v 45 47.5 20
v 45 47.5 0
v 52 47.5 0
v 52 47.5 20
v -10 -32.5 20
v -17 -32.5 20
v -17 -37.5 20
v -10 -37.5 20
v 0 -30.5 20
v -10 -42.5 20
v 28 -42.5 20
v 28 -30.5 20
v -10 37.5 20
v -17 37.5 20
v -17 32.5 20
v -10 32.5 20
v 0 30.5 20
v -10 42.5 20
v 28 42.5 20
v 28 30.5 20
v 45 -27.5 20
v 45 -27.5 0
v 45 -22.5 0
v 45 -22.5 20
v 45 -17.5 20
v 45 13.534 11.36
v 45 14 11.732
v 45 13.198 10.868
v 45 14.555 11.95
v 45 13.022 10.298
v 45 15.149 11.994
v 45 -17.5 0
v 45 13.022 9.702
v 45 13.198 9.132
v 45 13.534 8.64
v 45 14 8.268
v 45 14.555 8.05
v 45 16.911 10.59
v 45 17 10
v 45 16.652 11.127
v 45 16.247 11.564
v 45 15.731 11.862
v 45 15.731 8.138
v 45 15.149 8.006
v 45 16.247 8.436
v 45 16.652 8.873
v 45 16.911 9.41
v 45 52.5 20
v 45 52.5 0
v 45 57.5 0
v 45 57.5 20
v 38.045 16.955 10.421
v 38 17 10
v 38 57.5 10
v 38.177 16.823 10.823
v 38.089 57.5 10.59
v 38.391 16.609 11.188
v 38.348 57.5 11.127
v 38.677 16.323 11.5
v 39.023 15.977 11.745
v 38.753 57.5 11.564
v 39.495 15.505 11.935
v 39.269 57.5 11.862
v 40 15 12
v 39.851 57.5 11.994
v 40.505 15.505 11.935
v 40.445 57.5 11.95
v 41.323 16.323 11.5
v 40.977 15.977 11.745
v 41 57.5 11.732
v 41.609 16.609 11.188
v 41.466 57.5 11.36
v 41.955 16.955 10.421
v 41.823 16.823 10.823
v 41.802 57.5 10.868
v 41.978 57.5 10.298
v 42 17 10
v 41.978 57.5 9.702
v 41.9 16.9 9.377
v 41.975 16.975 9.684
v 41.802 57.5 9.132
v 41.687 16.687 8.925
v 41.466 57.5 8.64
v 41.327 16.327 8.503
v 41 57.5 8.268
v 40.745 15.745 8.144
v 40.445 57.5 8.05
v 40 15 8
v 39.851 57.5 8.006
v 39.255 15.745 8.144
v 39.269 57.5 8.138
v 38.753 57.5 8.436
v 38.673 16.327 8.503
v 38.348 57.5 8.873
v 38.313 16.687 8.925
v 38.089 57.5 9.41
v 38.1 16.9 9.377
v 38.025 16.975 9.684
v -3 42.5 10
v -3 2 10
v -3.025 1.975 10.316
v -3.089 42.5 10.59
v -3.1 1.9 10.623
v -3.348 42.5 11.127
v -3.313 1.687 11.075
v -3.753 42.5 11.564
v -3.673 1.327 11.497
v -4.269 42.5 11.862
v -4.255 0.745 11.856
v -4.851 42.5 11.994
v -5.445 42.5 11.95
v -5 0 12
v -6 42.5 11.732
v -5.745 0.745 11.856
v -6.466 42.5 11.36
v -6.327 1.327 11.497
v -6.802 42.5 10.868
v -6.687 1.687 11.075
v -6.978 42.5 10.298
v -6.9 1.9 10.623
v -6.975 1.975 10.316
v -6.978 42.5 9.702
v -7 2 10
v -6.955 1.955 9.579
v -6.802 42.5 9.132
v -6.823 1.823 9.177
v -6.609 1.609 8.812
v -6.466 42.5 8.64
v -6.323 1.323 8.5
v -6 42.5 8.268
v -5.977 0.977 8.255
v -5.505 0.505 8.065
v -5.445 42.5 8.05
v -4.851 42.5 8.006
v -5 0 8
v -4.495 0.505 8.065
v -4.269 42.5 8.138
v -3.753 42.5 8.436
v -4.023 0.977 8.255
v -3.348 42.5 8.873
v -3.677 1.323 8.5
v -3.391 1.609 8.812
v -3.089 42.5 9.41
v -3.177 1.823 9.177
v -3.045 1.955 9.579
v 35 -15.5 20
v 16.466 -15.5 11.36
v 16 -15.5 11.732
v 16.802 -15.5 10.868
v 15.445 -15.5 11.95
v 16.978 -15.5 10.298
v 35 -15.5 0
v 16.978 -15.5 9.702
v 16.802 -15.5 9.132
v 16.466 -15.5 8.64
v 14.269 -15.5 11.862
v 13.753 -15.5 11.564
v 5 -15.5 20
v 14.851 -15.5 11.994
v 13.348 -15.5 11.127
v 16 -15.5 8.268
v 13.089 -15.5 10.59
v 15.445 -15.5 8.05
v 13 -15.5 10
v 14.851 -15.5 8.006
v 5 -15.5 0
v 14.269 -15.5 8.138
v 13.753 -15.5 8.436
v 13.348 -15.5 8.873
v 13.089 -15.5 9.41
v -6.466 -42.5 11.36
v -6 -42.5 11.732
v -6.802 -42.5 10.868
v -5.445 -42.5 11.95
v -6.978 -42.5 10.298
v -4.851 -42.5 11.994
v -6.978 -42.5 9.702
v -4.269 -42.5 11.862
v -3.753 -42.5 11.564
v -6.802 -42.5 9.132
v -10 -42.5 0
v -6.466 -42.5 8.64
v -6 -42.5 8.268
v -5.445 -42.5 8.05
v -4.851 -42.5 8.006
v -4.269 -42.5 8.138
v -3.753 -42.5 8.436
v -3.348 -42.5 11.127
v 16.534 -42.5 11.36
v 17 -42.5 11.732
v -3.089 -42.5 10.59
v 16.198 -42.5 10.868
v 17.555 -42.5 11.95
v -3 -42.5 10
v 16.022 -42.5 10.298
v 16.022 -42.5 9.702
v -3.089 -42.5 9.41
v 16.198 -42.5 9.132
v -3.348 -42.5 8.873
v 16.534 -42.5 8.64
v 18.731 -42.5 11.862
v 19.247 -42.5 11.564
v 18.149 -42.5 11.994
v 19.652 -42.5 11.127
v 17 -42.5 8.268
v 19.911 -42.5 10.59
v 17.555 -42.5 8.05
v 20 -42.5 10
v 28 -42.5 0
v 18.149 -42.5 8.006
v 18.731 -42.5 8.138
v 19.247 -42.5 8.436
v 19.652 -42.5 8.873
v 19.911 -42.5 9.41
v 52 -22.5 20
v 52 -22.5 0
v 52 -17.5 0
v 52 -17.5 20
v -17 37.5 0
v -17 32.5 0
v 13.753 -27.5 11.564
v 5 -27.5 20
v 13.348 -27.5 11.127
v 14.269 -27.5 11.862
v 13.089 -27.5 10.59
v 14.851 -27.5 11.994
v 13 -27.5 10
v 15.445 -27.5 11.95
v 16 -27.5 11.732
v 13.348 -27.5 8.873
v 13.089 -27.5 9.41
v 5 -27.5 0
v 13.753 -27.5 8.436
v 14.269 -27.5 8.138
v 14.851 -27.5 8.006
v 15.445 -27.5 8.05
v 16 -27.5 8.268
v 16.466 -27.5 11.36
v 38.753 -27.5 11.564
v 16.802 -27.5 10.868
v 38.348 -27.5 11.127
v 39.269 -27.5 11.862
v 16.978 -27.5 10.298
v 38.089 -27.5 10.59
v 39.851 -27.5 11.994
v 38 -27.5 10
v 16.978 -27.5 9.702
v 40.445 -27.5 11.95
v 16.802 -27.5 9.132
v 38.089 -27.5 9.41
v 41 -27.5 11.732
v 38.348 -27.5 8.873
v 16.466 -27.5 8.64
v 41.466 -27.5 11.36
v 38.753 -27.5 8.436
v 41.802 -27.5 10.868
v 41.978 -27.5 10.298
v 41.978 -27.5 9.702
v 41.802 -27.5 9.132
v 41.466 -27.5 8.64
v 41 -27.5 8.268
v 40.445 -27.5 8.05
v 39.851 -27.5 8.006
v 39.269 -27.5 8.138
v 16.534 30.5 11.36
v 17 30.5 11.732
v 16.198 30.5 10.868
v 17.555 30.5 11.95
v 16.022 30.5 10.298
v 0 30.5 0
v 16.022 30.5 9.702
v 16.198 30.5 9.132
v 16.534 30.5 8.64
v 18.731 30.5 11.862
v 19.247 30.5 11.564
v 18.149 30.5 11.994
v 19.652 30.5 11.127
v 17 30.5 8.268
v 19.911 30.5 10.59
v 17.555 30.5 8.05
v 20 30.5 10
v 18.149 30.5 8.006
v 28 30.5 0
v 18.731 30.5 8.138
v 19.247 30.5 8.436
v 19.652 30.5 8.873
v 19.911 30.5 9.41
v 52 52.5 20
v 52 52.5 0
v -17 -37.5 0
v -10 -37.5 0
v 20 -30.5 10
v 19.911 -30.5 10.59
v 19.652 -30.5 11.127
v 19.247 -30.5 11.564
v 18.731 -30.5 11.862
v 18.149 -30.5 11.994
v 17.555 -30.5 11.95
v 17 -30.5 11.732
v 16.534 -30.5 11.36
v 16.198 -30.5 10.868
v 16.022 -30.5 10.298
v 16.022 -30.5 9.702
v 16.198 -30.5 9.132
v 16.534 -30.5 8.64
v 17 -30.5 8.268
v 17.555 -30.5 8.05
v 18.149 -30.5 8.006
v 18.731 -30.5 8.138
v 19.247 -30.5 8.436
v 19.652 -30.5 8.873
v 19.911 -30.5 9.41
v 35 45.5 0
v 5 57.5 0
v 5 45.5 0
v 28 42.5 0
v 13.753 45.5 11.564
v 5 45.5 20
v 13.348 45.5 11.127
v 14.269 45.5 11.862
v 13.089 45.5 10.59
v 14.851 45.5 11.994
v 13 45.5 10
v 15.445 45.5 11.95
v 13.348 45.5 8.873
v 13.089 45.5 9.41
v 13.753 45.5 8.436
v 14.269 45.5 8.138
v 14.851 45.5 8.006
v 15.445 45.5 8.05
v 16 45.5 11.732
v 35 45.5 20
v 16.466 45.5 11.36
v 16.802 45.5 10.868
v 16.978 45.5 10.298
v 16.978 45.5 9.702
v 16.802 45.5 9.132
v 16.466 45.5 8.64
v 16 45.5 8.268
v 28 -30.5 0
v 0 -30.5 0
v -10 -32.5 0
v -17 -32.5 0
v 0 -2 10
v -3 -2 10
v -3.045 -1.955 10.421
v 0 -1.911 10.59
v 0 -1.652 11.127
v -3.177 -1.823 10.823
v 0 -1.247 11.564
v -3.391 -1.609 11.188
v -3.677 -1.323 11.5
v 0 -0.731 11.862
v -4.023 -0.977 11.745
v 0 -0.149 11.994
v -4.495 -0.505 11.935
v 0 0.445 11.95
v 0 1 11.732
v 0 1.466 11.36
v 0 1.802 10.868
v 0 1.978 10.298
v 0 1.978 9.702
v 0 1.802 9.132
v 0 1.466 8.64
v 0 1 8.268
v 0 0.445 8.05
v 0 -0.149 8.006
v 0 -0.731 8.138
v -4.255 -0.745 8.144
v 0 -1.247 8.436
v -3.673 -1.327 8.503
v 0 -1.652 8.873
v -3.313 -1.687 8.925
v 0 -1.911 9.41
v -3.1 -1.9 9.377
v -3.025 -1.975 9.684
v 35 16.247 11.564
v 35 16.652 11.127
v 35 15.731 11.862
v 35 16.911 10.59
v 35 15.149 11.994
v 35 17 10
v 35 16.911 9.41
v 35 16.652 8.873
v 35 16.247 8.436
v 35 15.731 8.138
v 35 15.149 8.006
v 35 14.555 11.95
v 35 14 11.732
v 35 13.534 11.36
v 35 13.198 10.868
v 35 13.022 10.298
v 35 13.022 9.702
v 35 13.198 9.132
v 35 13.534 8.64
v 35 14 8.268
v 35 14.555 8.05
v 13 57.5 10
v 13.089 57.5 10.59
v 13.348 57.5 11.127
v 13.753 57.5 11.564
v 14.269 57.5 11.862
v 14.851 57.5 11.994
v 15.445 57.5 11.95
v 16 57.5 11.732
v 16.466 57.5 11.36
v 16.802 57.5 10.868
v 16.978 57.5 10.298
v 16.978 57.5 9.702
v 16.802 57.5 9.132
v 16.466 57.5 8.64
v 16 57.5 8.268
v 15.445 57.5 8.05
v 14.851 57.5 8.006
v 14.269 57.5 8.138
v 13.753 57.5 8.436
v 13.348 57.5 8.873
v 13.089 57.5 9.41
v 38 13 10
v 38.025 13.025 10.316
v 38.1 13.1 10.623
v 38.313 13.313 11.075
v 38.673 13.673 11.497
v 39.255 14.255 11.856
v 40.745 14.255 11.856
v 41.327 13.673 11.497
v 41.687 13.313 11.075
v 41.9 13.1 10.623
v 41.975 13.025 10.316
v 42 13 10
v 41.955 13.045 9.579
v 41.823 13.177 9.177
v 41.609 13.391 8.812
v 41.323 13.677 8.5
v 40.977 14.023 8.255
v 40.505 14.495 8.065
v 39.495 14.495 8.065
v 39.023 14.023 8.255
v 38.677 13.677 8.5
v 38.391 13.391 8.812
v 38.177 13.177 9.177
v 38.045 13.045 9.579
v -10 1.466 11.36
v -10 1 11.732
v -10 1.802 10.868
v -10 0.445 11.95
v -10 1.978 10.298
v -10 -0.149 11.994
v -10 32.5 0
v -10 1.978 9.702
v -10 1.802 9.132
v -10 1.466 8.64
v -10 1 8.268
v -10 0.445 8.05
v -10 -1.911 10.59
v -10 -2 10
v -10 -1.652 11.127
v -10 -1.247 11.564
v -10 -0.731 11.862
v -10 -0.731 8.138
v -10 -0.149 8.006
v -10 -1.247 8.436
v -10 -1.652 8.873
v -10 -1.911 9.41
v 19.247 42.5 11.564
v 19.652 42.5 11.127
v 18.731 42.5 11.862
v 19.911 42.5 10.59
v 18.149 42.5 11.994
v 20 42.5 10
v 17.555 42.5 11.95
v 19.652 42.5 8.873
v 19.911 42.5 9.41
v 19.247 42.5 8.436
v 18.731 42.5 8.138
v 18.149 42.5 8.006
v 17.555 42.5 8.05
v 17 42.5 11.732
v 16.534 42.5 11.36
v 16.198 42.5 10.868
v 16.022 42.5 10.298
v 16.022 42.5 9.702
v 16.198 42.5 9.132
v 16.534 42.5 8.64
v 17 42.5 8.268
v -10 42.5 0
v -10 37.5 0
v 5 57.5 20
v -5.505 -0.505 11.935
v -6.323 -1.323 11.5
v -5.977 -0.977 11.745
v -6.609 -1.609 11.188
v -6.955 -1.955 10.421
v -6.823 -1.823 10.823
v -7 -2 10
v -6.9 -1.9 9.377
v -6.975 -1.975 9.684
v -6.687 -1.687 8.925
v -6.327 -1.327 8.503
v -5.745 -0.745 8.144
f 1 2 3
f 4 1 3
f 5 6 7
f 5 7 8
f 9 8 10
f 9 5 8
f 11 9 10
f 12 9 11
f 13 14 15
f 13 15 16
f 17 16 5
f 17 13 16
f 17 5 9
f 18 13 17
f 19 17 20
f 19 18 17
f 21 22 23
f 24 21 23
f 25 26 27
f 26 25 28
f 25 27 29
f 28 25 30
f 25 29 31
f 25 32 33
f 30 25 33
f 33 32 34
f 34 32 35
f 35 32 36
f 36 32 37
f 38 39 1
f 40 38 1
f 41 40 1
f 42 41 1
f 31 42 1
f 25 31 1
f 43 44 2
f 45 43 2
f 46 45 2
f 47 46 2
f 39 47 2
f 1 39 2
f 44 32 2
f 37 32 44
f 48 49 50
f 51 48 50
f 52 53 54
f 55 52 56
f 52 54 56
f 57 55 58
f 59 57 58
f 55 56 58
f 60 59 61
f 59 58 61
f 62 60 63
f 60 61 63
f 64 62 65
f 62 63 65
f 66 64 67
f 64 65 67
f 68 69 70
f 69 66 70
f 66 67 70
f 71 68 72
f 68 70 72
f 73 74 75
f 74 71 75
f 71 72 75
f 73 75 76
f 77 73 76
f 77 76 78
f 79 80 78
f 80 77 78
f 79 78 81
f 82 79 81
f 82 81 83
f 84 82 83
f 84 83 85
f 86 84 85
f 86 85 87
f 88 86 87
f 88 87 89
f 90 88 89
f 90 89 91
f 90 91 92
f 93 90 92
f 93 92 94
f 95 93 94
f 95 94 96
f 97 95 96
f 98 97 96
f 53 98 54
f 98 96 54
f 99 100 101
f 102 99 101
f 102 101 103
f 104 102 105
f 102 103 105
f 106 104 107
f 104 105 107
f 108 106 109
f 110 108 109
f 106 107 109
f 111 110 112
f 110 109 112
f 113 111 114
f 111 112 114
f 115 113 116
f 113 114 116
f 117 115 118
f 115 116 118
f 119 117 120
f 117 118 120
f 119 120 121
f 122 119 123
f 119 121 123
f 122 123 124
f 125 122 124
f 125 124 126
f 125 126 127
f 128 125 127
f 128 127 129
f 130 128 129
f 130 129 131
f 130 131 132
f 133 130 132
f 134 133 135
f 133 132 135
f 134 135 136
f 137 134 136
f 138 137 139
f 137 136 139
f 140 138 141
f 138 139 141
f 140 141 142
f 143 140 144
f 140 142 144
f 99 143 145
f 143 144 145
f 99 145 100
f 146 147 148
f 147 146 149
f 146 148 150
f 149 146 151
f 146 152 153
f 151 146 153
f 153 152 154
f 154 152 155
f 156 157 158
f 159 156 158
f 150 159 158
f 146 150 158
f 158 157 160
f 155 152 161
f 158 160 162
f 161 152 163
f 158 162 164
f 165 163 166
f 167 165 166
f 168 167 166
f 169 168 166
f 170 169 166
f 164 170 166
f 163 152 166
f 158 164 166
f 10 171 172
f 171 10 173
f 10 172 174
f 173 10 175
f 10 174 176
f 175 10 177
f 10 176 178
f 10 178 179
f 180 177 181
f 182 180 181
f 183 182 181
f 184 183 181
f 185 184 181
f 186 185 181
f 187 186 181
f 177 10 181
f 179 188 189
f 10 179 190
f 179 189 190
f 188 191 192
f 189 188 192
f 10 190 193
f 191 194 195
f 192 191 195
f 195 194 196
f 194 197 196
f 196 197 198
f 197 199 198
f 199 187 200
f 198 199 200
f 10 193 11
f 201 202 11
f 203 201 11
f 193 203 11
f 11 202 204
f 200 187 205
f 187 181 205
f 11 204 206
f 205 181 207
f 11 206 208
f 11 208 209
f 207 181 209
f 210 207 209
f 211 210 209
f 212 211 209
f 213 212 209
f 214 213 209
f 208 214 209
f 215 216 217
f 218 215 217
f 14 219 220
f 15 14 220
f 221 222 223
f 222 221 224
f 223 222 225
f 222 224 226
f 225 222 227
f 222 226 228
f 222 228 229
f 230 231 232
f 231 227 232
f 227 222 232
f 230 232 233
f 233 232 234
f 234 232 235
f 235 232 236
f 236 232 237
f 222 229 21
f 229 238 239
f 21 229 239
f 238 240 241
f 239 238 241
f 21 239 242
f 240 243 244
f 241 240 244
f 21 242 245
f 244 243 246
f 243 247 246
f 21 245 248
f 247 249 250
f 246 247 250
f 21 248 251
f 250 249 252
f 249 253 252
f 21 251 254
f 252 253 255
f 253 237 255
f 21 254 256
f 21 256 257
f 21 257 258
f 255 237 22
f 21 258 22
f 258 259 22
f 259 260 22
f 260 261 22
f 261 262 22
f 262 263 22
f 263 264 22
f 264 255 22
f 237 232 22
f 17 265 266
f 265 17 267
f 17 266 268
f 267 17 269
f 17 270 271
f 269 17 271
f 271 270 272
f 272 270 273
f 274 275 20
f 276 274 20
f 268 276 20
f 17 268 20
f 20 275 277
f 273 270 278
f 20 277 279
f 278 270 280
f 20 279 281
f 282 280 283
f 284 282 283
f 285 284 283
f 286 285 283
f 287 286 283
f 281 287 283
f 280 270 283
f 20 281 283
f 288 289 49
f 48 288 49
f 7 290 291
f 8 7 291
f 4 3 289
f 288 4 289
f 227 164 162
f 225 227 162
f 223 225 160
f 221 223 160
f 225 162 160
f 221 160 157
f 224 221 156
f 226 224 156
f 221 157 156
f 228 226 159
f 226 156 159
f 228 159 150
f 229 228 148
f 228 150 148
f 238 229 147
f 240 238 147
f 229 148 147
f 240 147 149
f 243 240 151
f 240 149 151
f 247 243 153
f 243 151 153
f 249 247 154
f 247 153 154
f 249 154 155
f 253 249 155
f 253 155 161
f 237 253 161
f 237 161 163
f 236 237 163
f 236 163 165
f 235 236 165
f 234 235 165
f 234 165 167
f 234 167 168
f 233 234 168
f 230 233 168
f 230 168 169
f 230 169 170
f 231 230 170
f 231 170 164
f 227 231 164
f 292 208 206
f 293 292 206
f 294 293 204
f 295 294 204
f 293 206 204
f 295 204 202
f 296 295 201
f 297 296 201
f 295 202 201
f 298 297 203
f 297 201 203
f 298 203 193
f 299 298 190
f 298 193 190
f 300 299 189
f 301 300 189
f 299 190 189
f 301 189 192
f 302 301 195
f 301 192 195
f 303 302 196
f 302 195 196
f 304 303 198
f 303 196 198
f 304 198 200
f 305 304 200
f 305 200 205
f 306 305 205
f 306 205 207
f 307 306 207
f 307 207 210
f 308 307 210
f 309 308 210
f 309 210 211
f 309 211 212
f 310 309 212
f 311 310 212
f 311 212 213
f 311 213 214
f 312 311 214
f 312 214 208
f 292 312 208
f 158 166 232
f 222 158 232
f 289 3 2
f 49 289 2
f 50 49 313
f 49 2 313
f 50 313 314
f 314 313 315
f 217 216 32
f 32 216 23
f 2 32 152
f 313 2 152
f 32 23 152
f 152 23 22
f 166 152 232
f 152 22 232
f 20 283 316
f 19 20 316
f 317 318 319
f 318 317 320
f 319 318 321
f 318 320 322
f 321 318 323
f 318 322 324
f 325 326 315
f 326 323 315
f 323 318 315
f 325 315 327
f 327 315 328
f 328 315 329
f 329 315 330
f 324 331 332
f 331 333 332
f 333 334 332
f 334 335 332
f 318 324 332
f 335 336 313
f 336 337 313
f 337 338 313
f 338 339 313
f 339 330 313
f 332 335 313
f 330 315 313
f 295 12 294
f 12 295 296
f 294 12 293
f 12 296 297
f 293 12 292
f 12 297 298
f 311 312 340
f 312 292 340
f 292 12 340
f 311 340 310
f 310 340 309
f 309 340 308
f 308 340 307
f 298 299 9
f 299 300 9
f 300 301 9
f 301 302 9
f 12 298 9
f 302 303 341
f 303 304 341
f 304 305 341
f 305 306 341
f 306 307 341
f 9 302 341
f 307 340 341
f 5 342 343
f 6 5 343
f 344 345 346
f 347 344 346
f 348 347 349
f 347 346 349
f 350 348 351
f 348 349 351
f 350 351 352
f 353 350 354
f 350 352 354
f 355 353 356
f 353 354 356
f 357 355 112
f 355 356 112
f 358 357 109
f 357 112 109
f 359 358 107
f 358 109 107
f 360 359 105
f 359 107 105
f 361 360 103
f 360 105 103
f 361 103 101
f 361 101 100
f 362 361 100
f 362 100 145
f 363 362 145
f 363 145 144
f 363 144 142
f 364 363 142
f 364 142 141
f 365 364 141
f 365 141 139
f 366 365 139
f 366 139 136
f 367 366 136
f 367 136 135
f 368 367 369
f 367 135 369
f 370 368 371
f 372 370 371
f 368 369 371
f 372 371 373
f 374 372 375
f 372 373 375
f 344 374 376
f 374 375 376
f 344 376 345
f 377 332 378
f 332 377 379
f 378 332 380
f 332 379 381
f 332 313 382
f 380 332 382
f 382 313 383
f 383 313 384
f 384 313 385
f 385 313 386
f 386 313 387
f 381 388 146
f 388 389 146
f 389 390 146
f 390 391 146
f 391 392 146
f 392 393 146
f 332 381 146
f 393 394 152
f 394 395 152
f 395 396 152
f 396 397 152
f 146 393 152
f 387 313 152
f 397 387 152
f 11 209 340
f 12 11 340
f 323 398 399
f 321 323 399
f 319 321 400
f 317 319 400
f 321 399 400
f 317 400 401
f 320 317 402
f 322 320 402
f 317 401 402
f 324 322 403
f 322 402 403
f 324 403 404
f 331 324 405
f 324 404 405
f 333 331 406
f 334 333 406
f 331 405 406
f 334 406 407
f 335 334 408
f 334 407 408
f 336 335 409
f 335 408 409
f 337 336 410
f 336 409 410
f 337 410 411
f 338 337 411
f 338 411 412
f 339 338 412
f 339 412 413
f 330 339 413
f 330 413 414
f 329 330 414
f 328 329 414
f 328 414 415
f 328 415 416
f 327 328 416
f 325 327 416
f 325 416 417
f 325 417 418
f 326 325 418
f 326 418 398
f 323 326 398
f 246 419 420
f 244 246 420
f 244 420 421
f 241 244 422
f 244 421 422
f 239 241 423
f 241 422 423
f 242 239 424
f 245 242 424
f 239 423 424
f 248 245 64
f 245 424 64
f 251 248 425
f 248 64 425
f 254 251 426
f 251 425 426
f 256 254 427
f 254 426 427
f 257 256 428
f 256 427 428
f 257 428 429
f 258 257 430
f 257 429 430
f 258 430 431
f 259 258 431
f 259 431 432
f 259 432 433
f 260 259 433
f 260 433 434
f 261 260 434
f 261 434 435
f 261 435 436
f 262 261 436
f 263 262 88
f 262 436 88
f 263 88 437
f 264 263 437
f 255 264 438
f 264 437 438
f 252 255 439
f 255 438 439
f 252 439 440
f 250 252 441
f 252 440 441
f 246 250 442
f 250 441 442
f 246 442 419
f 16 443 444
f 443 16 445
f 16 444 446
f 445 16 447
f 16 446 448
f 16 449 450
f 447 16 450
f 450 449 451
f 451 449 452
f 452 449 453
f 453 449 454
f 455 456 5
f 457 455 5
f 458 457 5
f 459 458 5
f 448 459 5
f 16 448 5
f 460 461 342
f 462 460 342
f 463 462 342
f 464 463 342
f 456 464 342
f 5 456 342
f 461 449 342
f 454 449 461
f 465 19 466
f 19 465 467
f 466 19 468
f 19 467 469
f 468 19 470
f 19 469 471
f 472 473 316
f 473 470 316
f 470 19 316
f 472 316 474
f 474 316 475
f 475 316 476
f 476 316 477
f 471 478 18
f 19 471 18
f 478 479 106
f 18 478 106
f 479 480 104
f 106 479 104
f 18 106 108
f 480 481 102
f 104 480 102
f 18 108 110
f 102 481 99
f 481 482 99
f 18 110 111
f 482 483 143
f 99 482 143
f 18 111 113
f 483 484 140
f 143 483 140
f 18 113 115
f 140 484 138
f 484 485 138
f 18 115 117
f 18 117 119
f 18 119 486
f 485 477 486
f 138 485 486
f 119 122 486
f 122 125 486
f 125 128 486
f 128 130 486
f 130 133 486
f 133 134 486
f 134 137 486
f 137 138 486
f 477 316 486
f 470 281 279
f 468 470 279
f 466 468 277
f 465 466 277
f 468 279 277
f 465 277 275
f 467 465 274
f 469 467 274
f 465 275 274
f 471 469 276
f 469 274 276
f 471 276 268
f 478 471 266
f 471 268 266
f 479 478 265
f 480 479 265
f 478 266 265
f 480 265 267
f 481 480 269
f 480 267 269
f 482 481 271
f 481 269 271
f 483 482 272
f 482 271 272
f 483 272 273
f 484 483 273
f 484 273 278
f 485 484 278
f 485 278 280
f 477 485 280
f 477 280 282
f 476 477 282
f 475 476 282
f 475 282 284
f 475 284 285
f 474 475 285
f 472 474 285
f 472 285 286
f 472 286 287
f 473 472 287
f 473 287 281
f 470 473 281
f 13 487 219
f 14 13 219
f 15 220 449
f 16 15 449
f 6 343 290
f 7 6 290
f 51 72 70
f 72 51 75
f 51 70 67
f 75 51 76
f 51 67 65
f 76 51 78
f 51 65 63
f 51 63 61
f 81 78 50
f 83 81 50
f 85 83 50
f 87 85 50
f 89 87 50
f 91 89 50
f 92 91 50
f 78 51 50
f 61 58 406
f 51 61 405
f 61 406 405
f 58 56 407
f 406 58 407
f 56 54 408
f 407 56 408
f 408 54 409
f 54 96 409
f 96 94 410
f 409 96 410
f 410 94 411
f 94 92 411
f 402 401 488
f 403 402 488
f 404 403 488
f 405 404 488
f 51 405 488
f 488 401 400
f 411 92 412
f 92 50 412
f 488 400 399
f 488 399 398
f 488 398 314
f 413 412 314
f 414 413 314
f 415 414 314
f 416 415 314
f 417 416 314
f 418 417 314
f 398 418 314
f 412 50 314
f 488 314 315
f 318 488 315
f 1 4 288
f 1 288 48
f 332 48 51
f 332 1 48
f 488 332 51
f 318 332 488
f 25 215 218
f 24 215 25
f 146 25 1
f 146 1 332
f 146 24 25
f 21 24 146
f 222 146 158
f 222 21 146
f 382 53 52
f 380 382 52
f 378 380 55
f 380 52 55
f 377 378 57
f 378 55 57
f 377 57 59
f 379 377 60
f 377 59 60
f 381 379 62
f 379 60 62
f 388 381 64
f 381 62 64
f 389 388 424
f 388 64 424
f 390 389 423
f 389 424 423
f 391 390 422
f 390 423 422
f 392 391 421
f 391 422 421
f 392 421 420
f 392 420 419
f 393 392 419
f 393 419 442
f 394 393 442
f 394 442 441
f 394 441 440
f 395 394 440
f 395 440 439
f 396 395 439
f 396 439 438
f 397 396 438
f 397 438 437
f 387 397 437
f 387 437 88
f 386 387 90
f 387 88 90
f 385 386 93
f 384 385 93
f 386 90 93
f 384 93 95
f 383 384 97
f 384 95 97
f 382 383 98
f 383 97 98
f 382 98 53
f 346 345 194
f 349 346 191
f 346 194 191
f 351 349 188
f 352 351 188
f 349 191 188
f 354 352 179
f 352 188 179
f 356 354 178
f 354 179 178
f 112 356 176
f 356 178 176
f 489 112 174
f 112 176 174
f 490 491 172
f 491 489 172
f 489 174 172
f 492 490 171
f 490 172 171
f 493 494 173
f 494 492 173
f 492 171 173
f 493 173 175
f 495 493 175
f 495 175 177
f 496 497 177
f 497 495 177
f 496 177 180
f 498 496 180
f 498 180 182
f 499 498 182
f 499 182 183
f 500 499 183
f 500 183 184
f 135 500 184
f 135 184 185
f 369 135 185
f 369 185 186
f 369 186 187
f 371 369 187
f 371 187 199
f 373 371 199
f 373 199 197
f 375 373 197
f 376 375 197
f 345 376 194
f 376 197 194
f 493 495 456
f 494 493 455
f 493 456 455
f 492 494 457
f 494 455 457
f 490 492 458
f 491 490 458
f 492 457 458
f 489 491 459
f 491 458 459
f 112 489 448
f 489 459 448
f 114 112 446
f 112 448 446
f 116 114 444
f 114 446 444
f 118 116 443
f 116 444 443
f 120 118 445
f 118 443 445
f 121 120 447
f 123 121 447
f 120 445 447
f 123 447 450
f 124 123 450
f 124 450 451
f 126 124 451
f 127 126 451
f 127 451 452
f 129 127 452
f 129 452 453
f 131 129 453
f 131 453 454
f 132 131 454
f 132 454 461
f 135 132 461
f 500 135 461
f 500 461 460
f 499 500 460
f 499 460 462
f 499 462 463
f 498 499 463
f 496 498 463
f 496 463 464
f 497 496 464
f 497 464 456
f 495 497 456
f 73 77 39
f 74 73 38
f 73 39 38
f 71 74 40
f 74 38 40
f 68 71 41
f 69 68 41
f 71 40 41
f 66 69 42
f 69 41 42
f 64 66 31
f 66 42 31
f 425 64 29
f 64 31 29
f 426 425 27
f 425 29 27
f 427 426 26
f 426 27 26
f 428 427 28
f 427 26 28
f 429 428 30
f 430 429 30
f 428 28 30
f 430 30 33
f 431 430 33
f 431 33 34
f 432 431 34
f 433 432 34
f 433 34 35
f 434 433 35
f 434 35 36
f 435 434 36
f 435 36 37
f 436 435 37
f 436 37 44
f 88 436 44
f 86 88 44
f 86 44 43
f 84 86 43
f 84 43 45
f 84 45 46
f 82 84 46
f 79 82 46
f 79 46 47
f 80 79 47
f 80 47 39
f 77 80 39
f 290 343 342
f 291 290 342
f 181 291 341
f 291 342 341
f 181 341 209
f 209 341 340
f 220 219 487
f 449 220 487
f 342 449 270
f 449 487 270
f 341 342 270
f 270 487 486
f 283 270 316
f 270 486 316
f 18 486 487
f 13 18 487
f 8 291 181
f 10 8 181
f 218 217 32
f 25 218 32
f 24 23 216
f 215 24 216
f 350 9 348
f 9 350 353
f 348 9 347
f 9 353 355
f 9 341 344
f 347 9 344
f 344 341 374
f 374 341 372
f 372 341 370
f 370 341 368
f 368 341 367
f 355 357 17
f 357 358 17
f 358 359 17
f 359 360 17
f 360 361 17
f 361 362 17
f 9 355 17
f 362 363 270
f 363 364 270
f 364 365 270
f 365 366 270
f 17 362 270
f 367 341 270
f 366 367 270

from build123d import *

# Parameters (mm, degrees)
PAD_DEPTH       = 20
SKETCH004_R     = 2
POCKET002_DEPTH = 38.001
SKETCH005_R     = 2
POCKET003_DEPTH = 85.001
PAD001_DEPTH    = 20
SKETCH007_R     = 2
POCKET004_DEPTH = 40.001
SKETCH008_R     = 2
POCKET005_DEPTH = 85.001


with BuildPart() as soporte_agujero_superior_lateral:
    # Sketch → Pad (new body)
    with BuildSketch(Plane.XY):
        Polygon((-10, -42.5), (28, -42.5), (28, -30.5), (0, -30.5), (0, 30.5), (28, 30.5), (28, 42.5), (-10, 42.5), (-10, 37.5), (-17, 37.5), (-17, 32.5), (-10, 32.5), (-10, -32.5), (-17, -32.5), (-17, -37.5), (-10, -37.5), align=None)
    extrude(amount=PAD_DEPTH)

    # Sketch004 → Pocket002 (cut, through all)
    with BuildSketch(Plane(origin=(-10, 0, 0), x_dir=(0, -1, 0), z_dir=(-1, 0, 0))):
        with Locations((0, 10)):
            Circle(SKETCH004_R)
    extrude(amount=-POCKET002_DEPTH, mode=Mode.SUBTRACT)

    # Sketch005 → Pocket003 (cut, through all)
    with BuildSketch(Plane.XZ.offset(42.5)):
        with Locations((-5, 10)):
            Circle(SKETCH005_R)
        with Locations((18, 10)):
            Circle(SKETCH005_R)
    extrude(amount=-POCKET003_DEPTH, mode=Mode.SUBTRACT)


with BuildPart() as soporte_agujero_superior_lateral001:
    # Sketch006 → Pad001 (new body)
    with BuildSketch(Plane(origin=(35, 15, 0), x_dir=(-1, 0, 0), z_dir=(0, 0, 1))):
        Polygon((-10, -42.5), (30, -42.5), (30, -30.5), (0, -30.5), (0, 30.5), (30, 30.5), (30, 42.5), (-10, 42.5), (-10, 37.5), (-17, 37.5), (-17, 32.5), (-10, 32.5), (-10, -32.5), (-17, -32.5), (-17, -37.5), (-10, -37.5), align=None)
    extrude(amount=PAD001_DEPTH)

    # Sketch007 → Pocket004 (cut, through all)
    with BuildSketch(Plane(origin=(45, 15, 0), x_dir=(0, 1, 0), z_dir=(1, 0, 0))):
        with Locations((0, 10)):
            Circle(SKETCH007_R)
    extrude(amount=-POCKET004_DEPTH, mode=Mode.SUBTRACT)

    # Sketch008 → Pocket005 (cut, through all)
    with BuildSketch(Plane(origin=(35, 57.5, 0), x_dir=(-1, 0, 0), z_dir=(0, 1, 0))):
        with Locations((-5, 10)):
            Circle(SKETCH008_R)
        with Locations((20, 10)):
            Circle(SKETCH008_R)
    extrude(amount=-POCKET005_DEPTH, mode=Mode.SUBTRACT)


solid = Compound([soporte_agujero_superior_lateral.part, soporte_agujero_superior_lateral001.part])
